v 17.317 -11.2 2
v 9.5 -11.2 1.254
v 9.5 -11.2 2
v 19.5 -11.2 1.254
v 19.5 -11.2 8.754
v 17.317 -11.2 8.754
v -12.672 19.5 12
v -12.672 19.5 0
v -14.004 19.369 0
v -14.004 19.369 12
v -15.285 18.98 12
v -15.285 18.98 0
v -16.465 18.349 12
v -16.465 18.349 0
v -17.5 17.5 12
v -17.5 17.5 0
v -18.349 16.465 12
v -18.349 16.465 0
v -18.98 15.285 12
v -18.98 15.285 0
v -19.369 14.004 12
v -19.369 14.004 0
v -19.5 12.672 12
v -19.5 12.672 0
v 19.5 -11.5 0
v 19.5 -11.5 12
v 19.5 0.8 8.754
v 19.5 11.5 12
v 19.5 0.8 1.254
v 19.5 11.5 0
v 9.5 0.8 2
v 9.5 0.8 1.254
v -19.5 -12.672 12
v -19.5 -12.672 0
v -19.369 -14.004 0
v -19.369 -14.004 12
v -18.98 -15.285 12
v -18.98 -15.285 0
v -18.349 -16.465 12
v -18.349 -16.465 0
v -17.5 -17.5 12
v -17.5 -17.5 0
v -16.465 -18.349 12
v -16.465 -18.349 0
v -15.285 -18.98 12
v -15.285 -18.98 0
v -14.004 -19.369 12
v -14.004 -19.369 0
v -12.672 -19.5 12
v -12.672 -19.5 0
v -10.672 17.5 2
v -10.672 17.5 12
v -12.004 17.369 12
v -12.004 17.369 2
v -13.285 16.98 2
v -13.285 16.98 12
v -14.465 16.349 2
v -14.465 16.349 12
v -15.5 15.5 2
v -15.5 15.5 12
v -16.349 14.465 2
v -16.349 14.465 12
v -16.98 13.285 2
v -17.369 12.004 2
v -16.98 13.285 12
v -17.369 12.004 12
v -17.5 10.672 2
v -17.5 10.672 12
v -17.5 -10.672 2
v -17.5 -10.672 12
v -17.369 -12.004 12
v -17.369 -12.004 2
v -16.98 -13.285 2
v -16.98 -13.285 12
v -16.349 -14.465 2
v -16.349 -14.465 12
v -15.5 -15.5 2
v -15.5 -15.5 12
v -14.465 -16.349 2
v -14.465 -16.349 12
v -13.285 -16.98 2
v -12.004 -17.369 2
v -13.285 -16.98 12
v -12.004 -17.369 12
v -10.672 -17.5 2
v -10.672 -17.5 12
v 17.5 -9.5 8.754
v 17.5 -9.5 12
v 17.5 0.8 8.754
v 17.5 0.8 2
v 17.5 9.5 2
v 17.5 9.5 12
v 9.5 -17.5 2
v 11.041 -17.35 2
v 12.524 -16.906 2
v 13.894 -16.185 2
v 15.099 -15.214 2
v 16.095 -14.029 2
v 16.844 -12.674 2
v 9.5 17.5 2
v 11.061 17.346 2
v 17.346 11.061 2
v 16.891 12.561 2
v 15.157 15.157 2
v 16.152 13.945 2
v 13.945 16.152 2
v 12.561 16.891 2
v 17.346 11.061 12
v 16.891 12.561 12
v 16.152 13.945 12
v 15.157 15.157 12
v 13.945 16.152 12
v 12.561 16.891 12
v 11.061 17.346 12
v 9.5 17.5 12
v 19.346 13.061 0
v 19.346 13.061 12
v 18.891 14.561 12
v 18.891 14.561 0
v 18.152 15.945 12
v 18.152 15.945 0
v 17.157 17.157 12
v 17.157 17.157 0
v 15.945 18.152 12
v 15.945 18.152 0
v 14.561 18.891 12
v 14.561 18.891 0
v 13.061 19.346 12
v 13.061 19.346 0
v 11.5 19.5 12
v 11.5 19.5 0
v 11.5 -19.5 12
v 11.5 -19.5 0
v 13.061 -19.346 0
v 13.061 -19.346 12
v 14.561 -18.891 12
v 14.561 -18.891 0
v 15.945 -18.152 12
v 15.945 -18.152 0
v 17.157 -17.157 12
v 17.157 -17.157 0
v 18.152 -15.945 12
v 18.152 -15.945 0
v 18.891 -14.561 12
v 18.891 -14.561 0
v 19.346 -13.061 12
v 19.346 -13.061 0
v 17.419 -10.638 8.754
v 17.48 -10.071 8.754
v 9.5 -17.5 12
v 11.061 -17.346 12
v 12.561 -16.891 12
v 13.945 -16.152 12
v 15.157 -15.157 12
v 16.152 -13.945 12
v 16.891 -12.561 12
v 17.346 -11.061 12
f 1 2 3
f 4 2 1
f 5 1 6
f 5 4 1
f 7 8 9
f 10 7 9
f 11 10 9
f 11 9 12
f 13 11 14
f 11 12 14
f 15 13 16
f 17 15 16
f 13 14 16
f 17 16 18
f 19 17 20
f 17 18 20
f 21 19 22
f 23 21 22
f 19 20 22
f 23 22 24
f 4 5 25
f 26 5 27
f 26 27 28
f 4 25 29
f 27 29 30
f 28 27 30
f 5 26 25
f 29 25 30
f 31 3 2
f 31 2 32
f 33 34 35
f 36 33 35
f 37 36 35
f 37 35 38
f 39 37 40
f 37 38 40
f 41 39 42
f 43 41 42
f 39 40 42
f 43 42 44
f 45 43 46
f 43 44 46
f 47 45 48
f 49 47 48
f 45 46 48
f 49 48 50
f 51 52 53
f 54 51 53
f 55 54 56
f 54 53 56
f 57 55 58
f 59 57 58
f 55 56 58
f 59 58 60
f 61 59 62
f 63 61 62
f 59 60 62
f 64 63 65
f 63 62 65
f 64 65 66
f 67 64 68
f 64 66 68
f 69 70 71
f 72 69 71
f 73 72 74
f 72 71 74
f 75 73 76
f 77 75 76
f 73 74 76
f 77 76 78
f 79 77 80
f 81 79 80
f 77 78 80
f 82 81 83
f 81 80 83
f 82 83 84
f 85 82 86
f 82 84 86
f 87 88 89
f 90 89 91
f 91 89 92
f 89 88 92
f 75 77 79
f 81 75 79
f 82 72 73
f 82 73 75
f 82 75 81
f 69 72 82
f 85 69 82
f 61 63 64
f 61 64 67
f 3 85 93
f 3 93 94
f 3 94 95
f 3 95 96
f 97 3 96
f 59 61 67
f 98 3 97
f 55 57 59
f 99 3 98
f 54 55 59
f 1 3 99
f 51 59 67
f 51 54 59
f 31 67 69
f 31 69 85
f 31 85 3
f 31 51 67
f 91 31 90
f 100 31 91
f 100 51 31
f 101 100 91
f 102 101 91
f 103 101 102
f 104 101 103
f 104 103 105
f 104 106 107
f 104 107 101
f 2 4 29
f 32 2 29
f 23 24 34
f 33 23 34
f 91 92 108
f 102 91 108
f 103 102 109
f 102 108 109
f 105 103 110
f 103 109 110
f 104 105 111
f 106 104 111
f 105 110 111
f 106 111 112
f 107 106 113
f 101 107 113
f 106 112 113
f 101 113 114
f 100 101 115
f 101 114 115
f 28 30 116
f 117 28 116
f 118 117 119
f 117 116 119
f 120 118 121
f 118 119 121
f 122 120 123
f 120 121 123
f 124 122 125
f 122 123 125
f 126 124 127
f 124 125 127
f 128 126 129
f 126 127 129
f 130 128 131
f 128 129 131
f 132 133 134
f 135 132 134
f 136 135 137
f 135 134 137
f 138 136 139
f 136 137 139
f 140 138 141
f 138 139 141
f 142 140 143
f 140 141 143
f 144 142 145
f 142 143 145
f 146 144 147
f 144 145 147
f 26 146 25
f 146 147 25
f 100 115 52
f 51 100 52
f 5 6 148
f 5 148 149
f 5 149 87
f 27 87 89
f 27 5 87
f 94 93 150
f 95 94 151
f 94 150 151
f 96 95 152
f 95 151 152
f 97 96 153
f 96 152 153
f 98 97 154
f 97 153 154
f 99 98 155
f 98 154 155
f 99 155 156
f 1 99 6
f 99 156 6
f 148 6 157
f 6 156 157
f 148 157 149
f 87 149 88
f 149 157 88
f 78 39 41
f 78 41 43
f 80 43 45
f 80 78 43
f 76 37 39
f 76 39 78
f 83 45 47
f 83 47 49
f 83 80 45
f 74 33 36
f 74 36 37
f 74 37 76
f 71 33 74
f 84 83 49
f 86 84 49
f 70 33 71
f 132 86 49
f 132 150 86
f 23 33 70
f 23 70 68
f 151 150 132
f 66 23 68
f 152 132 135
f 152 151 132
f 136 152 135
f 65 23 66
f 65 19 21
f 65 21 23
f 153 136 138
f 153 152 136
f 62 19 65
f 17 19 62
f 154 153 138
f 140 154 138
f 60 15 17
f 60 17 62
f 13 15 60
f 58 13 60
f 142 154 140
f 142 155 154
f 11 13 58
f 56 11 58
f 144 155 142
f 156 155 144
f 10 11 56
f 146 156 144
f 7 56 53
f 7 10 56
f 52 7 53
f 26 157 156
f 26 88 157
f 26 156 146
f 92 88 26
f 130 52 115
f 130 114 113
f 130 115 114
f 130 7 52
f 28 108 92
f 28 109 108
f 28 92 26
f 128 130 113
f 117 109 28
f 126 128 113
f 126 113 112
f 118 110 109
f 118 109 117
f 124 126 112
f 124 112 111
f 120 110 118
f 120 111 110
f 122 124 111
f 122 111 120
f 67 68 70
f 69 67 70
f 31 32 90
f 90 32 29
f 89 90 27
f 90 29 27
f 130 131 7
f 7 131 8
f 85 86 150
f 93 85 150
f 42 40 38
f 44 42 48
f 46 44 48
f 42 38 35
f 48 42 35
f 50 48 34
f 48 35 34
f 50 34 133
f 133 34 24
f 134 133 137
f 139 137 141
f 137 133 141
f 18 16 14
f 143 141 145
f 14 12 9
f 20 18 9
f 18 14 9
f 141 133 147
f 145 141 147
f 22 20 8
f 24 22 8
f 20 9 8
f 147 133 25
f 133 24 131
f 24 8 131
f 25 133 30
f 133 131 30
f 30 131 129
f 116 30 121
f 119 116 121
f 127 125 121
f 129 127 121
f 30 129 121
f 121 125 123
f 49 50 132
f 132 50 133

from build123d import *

# Parameters (mm, degrees)
F1_DEPTH = 12
F3_DEPTH = 10
F4_W     = 12
F4_H     = 7.5
F5_DEPTH = 10


with BuildPart() as f1:
    # F0 (on Top) → F1 (new body)
    with BuildSketch(Plane.XY):
        with BuildLine():
            Line((-12.672, -19.5), (11.5, -19.5))
            ThreePointArc((11.5, -19.5), (17.156854, -17.156854), (19.5, -11.5))
            Line((19.5, -11.5), (19.5, 11.5))
            ThreePointArc((19.5, 11.5), (17.156854, 17.156854), (11.5, 19.5))
            Line((11.5, 19.5), (-12.672, 19.5))
            ThreePointArc((-12.672, 19.5), (-17.500125, 17.500125), (-19.5, 12.672))
            Line((-19.5, 12.672), (-19.5, -12.672))
            ThreePointArc((-19.5, -12.672), (-17.500125, -17.500125), (-12.672, -19.5))
        make_face()
    extrude(amount=F1_DEPTH)

    # F2 (on face) → F3 (cut)
    with BuildSketch(Plane.XY.offset(12)):
        with BuildLine():
            Line((-10.672, -17.5), (9.5, -17.5))
            ThreePointArc((9.5, -17.5), (15.156854, -15.156854), (17.5, -9.5))
            Line((17.5, -9.5), (17.5, 9.5))
            ThreePointArc((17.5, 9.5), (15.156854, 15.156854), (9.5, 17.5))
            Line((9.5, 17.5), (-10.672, 17.5))
            ThreePointArc((-10.672, 17.5), (-15.500125, 15.500125), (-17.5, 10.672))
            Line((-17.5, 10.672), (-17.5, -10.672))
            ThreePointArc((-17.5, -10.672), (-15.500125, -15.500125), (-10.672, -17.5))
        make_face()
    extrude(amount=-F3_DEPTH, mode=Mode.SUBTRACT)

    # F4 (on face) → F5 (cut)
    with BuildSketch(Plane.YZ.offset(19.5)):
        with Locations((-5.2, 5.004)):
            Rectangle(F4_W, F4_H)
    extrude(amount=-F5_DEPTH, mode=Mode.SUBTRACT)


solid = f1.part
